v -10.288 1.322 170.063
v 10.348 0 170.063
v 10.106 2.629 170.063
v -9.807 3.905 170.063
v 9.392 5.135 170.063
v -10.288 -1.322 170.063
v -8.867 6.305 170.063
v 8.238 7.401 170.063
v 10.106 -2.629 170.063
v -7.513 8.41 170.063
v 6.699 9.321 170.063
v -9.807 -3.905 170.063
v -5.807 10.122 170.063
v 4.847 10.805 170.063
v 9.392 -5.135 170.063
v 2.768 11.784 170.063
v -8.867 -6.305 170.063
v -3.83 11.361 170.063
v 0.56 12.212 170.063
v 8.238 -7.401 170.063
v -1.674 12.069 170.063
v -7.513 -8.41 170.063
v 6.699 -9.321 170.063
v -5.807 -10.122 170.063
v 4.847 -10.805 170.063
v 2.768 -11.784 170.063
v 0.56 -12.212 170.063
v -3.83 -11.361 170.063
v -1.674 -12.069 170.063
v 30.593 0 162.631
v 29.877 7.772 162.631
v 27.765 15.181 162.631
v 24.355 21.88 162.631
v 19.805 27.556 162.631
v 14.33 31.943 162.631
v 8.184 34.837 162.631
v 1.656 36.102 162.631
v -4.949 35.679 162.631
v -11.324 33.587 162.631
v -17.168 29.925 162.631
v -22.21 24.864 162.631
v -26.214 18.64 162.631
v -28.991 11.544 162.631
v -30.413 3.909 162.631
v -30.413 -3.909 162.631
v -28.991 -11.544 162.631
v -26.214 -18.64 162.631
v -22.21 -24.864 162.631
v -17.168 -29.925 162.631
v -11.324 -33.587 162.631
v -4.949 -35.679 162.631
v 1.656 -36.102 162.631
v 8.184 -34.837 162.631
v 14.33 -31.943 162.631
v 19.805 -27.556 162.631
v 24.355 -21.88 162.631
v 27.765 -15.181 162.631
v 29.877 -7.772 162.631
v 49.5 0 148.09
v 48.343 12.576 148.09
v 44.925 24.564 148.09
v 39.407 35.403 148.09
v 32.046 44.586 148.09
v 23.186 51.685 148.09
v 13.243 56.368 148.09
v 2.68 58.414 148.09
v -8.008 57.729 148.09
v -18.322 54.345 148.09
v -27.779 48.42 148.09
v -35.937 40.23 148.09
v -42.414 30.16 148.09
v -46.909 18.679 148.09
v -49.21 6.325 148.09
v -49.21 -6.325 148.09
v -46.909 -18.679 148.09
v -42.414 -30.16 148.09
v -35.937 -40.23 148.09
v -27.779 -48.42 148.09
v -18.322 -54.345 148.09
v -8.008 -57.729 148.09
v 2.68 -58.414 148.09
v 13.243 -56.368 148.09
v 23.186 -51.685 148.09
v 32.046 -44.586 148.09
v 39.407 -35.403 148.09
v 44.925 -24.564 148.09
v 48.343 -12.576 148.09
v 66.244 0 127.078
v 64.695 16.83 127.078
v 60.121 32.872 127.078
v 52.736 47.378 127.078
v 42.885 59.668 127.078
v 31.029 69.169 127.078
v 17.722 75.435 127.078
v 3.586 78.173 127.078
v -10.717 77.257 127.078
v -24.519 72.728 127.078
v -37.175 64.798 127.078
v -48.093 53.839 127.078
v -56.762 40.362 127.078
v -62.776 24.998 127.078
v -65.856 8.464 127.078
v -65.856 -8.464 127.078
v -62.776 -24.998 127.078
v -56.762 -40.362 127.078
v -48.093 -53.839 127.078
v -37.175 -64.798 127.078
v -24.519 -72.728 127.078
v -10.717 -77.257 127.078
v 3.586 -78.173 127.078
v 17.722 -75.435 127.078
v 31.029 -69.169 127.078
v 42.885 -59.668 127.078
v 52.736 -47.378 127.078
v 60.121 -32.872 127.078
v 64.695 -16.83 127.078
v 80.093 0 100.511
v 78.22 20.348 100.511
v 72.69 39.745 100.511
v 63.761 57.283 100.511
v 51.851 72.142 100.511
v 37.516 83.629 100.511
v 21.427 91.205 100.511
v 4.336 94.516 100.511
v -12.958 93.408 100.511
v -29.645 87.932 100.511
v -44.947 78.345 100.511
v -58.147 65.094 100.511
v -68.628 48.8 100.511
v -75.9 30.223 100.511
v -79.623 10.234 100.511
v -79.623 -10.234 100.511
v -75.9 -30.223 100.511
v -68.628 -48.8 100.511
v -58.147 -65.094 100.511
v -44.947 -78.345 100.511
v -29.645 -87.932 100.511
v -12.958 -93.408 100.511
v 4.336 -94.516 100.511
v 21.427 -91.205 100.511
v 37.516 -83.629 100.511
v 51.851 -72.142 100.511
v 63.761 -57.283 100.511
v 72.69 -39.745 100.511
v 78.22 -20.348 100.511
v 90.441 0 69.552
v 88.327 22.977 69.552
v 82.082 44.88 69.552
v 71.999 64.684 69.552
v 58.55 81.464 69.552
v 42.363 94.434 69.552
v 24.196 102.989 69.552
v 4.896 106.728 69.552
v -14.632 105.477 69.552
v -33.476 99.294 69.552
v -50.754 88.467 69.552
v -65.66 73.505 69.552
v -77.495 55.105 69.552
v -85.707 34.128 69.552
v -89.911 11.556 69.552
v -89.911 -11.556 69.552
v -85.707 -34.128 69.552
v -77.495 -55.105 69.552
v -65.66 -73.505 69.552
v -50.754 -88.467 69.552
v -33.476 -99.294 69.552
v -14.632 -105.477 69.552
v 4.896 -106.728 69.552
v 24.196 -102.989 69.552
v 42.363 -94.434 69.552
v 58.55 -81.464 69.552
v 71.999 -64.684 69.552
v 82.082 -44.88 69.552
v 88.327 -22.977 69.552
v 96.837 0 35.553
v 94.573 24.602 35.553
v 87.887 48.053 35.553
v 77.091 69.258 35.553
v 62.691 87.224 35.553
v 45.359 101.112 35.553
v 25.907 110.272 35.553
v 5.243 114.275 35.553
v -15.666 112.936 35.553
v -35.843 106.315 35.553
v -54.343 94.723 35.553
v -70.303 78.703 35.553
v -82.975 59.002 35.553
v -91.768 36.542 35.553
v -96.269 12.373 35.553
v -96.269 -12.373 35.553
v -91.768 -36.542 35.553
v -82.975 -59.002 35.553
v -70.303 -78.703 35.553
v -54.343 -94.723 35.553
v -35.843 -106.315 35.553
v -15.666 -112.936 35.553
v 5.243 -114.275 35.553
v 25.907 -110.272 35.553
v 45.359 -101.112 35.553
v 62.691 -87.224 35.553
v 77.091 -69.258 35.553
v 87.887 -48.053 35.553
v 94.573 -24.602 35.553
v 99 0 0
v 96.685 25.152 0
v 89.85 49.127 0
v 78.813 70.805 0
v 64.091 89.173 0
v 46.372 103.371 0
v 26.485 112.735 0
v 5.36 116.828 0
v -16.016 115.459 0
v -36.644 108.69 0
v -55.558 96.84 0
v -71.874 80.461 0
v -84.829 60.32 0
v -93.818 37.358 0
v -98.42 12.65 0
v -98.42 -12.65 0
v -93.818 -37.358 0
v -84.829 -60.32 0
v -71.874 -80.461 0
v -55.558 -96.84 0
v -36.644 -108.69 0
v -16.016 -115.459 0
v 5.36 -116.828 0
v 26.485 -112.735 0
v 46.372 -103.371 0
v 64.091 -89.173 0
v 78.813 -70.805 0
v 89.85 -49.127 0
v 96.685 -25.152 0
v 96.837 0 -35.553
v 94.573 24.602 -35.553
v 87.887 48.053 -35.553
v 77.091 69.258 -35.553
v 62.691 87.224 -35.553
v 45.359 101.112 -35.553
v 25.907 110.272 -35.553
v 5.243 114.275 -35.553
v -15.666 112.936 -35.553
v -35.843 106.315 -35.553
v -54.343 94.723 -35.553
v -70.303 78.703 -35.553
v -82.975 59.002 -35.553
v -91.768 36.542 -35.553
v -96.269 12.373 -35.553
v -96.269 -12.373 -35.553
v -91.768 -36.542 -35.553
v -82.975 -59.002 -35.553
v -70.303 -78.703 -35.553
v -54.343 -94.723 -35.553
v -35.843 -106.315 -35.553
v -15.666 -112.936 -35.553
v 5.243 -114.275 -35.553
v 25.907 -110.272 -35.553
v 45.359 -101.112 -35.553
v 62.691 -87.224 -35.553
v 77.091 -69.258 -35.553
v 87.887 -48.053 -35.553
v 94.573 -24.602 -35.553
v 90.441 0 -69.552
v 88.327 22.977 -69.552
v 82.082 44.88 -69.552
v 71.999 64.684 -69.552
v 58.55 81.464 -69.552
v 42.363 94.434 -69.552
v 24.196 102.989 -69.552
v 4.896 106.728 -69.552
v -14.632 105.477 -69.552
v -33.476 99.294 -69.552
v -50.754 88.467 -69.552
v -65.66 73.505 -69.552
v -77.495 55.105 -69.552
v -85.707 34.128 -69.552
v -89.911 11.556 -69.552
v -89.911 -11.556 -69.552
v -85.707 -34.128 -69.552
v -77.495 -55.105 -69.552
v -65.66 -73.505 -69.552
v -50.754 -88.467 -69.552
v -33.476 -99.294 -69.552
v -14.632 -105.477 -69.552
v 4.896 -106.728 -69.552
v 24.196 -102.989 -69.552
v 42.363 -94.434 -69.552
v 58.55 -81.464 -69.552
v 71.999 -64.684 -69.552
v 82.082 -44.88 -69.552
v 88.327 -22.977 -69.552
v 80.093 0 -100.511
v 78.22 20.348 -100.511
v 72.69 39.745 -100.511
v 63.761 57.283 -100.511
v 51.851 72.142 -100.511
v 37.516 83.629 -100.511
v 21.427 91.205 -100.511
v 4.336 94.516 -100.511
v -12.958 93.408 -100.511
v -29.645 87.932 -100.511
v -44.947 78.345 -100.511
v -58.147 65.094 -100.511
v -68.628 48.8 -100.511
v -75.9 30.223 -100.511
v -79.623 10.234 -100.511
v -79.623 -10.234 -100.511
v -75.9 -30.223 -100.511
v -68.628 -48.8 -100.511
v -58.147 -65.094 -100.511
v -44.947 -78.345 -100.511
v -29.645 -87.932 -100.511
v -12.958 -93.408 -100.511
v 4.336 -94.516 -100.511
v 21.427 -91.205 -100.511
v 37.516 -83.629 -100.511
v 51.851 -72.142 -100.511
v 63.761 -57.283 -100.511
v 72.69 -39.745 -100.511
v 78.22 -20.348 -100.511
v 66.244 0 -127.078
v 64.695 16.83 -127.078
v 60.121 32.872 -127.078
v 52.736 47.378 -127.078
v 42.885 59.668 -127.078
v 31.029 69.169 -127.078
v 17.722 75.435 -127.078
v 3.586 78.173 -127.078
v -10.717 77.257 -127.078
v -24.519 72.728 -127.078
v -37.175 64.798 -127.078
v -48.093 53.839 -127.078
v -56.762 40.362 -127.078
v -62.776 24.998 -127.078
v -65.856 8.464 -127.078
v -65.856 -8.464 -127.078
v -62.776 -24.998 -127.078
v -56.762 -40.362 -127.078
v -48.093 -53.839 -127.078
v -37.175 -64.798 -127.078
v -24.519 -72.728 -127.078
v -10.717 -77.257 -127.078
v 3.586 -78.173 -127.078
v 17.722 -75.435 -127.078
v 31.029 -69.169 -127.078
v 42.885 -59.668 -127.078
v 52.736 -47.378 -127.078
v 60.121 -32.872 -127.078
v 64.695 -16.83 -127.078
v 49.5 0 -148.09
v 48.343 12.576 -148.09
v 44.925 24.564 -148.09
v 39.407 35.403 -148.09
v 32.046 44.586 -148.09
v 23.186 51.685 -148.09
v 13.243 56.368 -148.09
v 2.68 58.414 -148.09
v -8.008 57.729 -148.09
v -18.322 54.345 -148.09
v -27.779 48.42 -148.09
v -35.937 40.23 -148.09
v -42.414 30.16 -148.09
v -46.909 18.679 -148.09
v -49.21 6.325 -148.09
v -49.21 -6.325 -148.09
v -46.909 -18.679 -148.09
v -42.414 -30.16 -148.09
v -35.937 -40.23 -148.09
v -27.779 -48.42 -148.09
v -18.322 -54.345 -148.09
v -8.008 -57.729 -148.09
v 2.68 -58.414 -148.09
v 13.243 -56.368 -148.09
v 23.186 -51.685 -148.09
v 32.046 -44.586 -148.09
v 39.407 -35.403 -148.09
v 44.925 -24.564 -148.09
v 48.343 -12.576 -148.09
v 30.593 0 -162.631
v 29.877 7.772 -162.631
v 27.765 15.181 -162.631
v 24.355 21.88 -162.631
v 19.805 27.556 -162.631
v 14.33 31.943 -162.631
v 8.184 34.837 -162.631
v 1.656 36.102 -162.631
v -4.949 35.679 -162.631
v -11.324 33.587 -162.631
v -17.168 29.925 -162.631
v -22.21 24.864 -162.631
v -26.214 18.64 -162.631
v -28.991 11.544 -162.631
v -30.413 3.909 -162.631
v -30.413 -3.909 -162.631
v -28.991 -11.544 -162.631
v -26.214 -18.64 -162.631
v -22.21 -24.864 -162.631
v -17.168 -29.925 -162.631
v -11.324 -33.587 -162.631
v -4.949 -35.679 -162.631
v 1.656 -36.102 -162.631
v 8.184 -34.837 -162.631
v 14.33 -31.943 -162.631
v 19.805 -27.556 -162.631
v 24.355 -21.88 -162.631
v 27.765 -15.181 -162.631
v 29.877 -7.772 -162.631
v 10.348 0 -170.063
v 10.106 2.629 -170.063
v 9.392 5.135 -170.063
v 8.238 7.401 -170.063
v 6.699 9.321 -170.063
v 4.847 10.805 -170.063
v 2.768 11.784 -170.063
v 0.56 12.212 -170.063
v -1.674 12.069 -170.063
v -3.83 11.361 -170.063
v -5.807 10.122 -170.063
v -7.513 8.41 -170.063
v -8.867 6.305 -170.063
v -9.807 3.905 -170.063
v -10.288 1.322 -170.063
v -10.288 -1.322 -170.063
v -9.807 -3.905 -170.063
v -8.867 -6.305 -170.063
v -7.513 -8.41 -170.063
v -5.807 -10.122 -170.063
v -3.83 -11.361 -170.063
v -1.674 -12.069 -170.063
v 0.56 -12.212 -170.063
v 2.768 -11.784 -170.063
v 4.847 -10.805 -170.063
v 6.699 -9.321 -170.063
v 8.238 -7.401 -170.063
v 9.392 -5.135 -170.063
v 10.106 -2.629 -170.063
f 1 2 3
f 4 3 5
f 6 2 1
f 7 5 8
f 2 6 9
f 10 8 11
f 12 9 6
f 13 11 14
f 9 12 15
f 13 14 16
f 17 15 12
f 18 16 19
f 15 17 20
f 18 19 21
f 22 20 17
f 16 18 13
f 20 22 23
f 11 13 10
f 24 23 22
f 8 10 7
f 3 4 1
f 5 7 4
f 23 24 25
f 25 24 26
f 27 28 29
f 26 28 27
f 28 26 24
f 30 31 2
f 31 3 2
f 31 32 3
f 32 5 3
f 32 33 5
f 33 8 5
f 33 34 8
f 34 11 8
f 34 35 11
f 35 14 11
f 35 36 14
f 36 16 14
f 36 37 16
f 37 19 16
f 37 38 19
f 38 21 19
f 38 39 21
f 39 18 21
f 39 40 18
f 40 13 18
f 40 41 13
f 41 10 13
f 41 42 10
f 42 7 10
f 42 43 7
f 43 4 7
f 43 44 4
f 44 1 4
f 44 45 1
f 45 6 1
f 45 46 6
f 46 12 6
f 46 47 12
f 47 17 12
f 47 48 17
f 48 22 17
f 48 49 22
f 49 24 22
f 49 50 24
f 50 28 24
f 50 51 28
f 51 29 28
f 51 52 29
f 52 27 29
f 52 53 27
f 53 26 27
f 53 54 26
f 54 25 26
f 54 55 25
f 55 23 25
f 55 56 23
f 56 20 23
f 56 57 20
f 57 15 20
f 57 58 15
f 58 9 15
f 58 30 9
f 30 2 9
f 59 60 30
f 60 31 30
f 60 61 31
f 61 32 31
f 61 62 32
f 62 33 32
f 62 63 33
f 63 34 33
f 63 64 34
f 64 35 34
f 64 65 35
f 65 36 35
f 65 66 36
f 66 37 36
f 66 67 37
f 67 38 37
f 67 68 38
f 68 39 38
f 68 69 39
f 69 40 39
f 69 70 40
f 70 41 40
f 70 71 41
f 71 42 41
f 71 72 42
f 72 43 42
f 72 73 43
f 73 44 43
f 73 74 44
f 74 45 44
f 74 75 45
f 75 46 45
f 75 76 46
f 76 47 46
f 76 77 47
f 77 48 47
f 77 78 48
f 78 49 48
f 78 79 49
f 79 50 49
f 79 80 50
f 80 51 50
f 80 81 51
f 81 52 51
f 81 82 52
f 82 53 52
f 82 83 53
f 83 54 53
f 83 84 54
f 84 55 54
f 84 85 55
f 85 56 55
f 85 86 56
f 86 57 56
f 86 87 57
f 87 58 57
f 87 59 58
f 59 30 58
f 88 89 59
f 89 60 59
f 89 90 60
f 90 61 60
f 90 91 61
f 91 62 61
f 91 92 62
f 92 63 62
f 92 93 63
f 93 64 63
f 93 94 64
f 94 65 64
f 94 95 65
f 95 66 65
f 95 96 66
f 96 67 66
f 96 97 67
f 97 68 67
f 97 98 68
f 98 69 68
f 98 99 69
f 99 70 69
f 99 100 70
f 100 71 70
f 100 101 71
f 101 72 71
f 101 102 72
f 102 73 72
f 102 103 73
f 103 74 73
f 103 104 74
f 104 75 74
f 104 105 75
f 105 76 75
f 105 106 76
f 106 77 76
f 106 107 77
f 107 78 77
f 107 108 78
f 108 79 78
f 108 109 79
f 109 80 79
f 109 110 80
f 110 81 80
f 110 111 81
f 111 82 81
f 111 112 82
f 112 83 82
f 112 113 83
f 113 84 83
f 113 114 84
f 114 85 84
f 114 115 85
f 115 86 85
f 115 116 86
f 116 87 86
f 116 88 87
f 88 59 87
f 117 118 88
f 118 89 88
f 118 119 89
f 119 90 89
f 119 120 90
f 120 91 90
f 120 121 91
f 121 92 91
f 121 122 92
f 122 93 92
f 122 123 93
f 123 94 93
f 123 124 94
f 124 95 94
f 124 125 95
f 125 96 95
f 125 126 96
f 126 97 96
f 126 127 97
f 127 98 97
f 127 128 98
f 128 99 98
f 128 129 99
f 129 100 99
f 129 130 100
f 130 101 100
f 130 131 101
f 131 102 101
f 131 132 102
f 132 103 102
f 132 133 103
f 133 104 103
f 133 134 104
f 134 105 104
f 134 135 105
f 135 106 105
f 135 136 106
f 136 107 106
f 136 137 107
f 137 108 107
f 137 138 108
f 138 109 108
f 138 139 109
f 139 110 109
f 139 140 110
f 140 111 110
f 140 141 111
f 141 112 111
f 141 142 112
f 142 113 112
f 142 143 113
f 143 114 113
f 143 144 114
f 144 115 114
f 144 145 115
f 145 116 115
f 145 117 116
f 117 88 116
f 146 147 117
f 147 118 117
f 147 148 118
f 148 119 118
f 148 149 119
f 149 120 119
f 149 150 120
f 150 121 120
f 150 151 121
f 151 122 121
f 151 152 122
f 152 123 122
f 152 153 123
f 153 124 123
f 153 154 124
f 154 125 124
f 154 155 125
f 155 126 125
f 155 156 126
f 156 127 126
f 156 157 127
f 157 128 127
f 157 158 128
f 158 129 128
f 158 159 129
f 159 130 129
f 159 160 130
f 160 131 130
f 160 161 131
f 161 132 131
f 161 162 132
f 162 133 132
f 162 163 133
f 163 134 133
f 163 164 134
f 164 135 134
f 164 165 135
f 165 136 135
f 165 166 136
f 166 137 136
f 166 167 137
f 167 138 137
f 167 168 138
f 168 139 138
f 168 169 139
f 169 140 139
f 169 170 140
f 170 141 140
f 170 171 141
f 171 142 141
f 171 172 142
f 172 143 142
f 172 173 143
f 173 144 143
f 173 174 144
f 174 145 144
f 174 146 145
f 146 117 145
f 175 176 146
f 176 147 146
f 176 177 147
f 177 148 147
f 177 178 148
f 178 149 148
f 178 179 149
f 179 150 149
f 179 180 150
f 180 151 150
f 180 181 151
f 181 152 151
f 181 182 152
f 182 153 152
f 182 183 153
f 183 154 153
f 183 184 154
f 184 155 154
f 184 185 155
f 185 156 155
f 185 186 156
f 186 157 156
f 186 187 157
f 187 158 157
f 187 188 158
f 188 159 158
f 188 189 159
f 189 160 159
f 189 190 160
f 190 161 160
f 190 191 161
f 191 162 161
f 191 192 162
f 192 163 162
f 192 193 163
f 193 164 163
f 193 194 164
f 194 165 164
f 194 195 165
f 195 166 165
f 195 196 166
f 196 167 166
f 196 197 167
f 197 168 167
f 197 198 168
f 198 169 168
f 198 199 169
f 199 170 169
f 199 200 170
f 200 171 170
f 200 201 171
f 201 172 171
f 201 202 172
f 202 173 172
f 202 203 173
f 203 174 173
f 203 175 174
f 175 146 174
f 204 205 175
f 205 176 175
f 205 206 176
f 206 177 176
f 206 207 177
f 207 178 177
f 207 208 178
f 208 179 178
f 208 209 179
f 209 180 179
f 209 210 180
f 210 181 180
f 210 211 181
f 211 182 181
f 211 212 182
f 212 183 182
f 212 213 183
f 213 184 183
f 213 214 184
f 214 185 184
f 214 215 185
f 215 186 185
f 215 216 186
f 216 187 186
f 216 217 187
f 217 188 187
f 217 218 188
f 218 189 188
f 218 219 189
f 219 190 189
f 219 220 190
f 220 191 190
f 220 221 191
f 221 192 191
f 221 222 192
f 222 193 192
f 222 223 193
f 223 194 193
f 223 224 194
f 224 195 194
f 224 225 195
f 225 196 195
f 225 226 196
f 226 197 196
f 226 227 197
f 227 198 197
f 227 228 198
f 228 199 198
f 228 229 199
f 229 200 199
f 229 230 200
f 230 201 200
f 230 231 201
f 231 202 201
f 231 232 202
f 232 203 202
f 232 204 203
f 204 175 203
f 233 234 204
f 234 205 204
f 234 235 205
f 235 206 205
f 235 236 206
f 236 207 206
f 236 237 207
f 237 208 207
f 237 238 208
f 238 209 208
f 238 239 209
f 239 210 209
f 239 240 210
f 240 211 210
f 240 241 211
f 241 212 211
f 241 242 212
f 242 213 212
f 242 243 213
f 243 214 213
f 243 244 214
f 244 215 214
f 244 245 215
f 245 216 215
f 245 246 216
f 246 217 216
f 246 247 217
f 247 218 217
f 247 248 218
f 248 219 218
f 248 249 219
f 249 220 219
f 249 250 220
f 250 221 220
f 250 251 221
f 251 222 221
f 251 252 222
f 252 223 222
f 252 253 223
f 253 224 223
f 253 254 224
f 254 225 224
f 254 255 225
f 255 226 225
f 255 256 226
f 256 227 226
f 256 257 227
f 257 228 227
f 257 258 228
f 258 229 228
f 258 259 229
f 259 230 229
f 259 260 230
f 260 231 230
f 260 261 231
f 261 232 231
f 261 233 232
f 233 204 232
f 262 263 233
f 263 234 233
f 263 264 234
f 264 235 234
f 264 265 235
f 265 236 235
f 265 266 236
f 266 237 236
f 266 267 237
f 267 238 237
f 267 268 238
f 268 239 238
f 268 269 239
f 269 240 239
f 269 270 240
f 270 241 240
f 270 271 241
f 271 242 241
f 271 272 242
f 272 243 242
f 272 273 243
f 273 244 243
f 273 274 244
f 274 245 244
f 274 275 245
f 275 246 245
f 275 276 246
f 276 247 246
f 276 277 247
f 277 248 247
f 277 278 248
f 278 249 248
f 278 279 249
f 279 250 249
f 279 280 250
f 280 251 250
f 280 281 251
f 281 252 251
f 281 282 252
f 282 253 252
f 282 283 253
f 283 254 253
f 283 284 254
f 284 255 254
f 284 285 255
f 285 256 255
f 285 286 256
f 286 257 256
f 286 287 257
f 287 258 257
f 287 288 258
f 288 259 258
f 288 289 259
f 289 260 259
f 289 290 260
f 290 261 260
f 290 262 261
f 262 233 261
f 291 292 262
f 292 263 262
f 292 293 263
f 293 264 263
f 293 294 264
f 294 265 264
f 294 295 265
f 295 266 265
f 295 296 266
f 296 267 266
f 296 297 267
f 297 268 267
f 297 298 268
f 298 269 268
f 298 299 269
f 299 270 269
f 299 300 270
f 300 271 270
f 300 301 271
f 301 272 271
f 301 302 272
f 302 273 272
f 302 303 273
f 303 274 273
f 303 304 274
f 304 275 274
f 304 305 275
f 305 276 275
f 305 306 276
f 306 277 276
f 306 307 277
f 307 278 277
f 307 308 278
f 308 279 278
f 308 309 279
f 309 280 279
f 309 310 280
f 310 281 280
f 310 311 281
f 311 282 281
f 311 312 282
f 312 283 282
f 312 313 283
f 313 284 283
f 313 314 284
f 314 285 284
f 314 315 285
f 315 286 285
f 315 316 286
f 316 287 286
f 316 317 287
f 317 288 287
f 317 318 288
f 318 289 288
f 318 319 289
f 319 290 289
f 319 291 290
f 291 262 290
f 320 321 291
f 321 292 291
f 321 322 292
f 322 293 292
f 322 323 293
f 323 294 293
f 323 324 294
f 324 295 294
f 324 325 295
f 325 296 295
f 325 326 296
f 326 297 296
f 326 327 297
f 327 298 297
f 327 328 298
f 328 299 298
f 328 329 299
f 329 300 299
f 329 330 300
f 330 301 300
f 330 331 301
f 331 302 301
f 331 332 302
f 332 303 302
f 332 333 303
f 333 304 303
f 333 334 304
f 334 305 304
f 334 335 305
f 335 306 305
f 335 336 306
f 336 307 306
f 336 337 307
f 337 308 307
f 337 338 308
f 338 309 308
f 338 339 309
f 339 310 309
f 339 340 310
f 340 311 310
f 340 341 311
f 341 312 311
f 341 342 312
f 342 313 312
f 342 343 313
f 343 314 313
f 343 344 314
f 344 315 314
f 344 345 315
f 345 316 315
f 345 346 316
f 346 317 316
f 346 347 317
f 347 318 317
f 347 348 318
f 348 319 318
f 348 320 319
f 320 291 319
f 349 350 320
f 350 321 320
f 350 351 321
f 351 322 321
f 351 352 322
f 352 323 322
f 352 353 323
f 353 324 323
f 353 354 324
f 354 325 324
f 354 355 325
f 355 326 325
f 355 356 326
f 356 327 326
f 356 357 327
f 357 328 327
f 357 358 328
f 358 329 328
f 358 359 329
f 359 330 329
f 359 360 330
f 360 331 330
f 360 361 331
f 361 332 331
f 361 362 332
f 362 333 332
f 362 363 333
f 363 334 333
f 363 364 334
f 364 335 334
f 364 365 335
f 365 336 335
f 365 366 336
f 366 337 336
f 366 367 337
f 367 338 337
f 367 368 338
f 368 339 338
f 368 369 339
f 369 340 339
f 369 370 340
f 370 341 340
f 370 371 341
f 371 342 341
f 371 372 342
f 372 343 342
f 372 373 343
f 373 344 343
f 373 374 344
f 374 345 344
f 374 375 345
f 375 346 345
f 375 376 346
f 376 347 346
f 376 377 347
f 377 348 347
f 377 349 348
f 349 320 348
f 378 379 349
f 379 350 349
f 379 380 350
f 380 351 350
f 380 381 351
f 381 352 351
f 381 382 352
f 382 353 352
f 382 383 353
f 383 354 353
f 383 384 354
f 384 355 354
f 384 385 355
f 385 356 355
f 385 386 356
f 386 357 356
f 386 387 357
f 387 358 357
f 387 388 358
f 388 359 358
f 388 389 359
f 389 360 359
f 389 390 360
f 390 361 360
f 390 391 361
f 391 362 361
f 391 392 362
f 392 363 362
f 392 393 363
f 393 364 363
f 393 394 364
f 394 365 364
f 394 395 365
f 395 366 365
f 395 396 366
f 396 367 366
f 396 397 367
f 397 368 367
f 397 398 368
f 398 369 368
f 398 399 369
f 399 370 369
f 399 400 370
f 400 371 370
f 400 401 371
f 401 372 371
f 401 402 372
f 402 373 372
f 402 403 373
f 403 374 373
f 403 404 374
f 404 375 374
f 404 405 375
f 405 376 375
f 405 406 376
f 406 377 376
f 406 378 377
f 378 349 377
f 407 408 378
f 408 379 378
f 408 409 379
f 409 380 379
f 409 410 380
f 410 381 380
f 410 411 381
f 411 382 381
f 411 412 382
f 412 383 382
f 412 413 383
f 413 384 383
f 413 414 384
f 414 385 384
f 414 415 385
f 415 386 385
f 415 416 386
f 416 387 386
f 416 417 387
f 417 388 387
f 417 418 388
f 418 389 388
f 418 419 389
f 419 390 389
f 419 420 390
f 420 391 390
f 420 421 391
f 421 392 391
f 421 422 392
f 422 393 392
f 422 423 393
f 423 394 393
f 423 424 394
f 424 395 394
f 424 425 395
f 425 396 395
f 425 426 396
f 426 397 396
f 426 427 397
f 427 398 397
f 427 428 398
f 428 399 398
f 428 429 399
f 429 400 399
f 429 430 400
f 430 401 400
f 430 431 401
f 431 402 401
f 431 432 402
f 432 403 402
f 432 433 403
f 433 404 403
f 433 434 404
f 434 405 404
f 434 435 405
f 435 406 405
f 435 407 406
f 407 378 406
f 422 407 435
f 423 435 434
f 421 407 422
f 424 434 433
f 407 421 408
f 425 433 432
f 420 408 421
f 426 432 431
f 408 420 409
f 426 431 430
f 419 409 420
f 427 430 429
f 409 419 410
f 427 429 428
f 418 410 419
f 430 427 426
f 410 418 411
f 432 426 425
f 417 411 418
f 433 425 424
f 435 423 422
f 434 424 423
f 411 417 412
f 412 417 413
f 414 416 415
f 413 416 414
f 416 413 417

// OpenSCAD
// Generated by SolidPython 1.0.1 on 2020-07-29 00:46:49


scale(v = [11, 13, 19]) {
	sphere(r = 9);
}
/***********************************************
*********      SolidPython code:      **********
************************************************
 
# import packages: SolidPython
from solid import *
from solid.utils import *
from itertools import chain, combinations, permutations


class Resize:

    def __init__(self, scad_file):
        self.scad_file = scad_file
        #self.scad_file = import_scad(scad_file)
        # cone/cylinder param:
        self.r1 = 0
        self.r2 = 0
        self.h = 0
        # rectangular prism param:
        self.w = 0
        self.l = 0
        # ellipse param:
        self.r = 0

    # import OpenScad code (file name corresponds to shape)


    # classify shape + parameters
    def assign(self, param1, param2, param3):
        if self.scad_file == 'cone.scad':
            self.r1 = param1
            self.r2 = param2
            self.h = param3
        elif self.scad_file == 'cylinder.scad':
            self.r1 = param1
            self.r2 = param2
            self.h = param3
        elif self.scad_file == 'rectangularPrism.scad':
            self.h = param1
            self.l = param2
            self.w = param3
        else:
            self.r = param1
            self.h = param2

    # resize parameters
    def iterate(self):
        x = range(3, 20, 2)
        i = 1
        if self.scad_file == 'cone.scad':
            tempList = list(permutations(x, 2))
            for temp in tempList:
                param1 = temp[0]
                param2 = temp[1]
                filepath = 'produced_scad_files/' + 'cone' + str(param1) + '_' + str(param2) + '_' + '.scad'
                scad_render_to_file(cylinder(h=param1, r1=param2, r2=0), filepath)

        elif self.scad_file == 'cylinder.scad':
            tempList = list(permutations(x, 3))
            for temp in tempList:
                param1 = temp[0]
                param2 = temp[1]
                filepath = 'produced_scad_files/' + 'cylinder' + str(param1) + '_' + str(param2) + '_' + '.scad'
                scad_render_to_file(cylinder(h=param1, r1=param2, r2=param2), filepath)

        elif self.scad_file == 'rectangularPrism.scad':
            tempList = list(permutations(x, 3))
            for temp in tempList:
                param1 = temp[0]
                param2 = temp[1]
                param3 = temp[2]
                filepath = 'produced_scad_files/' + 'rectangularPrism' + str(param1) + '_' + str(param2) + '_' + str(
                    param3) + '.scad'
                scad_render_to_file(cube(size=(param1, param2, param3)), filepath)

        elif self.scad_file == 'ellipse.scad':
            tempList = list(permutations(x, 4))
            for temp in tempList:
                param1 = temp[0]
                param2 = temp[1]
                param3 = temp[2]
                param4 = temp[3]
                filepath = 'produced_scad_files/' + 'ellipse' + str(param1) + '_' + str(param2) + '_' + str(param3) + '_' + str(param4) + '.scad'
                scad_render_to_file(scale([param1, param2, param3])(sphere(r=param4)), filepath)

    def render_to_scadfile(self):
        scad_render_to_file(scad, 'example.scad') 
 
************************************************/
